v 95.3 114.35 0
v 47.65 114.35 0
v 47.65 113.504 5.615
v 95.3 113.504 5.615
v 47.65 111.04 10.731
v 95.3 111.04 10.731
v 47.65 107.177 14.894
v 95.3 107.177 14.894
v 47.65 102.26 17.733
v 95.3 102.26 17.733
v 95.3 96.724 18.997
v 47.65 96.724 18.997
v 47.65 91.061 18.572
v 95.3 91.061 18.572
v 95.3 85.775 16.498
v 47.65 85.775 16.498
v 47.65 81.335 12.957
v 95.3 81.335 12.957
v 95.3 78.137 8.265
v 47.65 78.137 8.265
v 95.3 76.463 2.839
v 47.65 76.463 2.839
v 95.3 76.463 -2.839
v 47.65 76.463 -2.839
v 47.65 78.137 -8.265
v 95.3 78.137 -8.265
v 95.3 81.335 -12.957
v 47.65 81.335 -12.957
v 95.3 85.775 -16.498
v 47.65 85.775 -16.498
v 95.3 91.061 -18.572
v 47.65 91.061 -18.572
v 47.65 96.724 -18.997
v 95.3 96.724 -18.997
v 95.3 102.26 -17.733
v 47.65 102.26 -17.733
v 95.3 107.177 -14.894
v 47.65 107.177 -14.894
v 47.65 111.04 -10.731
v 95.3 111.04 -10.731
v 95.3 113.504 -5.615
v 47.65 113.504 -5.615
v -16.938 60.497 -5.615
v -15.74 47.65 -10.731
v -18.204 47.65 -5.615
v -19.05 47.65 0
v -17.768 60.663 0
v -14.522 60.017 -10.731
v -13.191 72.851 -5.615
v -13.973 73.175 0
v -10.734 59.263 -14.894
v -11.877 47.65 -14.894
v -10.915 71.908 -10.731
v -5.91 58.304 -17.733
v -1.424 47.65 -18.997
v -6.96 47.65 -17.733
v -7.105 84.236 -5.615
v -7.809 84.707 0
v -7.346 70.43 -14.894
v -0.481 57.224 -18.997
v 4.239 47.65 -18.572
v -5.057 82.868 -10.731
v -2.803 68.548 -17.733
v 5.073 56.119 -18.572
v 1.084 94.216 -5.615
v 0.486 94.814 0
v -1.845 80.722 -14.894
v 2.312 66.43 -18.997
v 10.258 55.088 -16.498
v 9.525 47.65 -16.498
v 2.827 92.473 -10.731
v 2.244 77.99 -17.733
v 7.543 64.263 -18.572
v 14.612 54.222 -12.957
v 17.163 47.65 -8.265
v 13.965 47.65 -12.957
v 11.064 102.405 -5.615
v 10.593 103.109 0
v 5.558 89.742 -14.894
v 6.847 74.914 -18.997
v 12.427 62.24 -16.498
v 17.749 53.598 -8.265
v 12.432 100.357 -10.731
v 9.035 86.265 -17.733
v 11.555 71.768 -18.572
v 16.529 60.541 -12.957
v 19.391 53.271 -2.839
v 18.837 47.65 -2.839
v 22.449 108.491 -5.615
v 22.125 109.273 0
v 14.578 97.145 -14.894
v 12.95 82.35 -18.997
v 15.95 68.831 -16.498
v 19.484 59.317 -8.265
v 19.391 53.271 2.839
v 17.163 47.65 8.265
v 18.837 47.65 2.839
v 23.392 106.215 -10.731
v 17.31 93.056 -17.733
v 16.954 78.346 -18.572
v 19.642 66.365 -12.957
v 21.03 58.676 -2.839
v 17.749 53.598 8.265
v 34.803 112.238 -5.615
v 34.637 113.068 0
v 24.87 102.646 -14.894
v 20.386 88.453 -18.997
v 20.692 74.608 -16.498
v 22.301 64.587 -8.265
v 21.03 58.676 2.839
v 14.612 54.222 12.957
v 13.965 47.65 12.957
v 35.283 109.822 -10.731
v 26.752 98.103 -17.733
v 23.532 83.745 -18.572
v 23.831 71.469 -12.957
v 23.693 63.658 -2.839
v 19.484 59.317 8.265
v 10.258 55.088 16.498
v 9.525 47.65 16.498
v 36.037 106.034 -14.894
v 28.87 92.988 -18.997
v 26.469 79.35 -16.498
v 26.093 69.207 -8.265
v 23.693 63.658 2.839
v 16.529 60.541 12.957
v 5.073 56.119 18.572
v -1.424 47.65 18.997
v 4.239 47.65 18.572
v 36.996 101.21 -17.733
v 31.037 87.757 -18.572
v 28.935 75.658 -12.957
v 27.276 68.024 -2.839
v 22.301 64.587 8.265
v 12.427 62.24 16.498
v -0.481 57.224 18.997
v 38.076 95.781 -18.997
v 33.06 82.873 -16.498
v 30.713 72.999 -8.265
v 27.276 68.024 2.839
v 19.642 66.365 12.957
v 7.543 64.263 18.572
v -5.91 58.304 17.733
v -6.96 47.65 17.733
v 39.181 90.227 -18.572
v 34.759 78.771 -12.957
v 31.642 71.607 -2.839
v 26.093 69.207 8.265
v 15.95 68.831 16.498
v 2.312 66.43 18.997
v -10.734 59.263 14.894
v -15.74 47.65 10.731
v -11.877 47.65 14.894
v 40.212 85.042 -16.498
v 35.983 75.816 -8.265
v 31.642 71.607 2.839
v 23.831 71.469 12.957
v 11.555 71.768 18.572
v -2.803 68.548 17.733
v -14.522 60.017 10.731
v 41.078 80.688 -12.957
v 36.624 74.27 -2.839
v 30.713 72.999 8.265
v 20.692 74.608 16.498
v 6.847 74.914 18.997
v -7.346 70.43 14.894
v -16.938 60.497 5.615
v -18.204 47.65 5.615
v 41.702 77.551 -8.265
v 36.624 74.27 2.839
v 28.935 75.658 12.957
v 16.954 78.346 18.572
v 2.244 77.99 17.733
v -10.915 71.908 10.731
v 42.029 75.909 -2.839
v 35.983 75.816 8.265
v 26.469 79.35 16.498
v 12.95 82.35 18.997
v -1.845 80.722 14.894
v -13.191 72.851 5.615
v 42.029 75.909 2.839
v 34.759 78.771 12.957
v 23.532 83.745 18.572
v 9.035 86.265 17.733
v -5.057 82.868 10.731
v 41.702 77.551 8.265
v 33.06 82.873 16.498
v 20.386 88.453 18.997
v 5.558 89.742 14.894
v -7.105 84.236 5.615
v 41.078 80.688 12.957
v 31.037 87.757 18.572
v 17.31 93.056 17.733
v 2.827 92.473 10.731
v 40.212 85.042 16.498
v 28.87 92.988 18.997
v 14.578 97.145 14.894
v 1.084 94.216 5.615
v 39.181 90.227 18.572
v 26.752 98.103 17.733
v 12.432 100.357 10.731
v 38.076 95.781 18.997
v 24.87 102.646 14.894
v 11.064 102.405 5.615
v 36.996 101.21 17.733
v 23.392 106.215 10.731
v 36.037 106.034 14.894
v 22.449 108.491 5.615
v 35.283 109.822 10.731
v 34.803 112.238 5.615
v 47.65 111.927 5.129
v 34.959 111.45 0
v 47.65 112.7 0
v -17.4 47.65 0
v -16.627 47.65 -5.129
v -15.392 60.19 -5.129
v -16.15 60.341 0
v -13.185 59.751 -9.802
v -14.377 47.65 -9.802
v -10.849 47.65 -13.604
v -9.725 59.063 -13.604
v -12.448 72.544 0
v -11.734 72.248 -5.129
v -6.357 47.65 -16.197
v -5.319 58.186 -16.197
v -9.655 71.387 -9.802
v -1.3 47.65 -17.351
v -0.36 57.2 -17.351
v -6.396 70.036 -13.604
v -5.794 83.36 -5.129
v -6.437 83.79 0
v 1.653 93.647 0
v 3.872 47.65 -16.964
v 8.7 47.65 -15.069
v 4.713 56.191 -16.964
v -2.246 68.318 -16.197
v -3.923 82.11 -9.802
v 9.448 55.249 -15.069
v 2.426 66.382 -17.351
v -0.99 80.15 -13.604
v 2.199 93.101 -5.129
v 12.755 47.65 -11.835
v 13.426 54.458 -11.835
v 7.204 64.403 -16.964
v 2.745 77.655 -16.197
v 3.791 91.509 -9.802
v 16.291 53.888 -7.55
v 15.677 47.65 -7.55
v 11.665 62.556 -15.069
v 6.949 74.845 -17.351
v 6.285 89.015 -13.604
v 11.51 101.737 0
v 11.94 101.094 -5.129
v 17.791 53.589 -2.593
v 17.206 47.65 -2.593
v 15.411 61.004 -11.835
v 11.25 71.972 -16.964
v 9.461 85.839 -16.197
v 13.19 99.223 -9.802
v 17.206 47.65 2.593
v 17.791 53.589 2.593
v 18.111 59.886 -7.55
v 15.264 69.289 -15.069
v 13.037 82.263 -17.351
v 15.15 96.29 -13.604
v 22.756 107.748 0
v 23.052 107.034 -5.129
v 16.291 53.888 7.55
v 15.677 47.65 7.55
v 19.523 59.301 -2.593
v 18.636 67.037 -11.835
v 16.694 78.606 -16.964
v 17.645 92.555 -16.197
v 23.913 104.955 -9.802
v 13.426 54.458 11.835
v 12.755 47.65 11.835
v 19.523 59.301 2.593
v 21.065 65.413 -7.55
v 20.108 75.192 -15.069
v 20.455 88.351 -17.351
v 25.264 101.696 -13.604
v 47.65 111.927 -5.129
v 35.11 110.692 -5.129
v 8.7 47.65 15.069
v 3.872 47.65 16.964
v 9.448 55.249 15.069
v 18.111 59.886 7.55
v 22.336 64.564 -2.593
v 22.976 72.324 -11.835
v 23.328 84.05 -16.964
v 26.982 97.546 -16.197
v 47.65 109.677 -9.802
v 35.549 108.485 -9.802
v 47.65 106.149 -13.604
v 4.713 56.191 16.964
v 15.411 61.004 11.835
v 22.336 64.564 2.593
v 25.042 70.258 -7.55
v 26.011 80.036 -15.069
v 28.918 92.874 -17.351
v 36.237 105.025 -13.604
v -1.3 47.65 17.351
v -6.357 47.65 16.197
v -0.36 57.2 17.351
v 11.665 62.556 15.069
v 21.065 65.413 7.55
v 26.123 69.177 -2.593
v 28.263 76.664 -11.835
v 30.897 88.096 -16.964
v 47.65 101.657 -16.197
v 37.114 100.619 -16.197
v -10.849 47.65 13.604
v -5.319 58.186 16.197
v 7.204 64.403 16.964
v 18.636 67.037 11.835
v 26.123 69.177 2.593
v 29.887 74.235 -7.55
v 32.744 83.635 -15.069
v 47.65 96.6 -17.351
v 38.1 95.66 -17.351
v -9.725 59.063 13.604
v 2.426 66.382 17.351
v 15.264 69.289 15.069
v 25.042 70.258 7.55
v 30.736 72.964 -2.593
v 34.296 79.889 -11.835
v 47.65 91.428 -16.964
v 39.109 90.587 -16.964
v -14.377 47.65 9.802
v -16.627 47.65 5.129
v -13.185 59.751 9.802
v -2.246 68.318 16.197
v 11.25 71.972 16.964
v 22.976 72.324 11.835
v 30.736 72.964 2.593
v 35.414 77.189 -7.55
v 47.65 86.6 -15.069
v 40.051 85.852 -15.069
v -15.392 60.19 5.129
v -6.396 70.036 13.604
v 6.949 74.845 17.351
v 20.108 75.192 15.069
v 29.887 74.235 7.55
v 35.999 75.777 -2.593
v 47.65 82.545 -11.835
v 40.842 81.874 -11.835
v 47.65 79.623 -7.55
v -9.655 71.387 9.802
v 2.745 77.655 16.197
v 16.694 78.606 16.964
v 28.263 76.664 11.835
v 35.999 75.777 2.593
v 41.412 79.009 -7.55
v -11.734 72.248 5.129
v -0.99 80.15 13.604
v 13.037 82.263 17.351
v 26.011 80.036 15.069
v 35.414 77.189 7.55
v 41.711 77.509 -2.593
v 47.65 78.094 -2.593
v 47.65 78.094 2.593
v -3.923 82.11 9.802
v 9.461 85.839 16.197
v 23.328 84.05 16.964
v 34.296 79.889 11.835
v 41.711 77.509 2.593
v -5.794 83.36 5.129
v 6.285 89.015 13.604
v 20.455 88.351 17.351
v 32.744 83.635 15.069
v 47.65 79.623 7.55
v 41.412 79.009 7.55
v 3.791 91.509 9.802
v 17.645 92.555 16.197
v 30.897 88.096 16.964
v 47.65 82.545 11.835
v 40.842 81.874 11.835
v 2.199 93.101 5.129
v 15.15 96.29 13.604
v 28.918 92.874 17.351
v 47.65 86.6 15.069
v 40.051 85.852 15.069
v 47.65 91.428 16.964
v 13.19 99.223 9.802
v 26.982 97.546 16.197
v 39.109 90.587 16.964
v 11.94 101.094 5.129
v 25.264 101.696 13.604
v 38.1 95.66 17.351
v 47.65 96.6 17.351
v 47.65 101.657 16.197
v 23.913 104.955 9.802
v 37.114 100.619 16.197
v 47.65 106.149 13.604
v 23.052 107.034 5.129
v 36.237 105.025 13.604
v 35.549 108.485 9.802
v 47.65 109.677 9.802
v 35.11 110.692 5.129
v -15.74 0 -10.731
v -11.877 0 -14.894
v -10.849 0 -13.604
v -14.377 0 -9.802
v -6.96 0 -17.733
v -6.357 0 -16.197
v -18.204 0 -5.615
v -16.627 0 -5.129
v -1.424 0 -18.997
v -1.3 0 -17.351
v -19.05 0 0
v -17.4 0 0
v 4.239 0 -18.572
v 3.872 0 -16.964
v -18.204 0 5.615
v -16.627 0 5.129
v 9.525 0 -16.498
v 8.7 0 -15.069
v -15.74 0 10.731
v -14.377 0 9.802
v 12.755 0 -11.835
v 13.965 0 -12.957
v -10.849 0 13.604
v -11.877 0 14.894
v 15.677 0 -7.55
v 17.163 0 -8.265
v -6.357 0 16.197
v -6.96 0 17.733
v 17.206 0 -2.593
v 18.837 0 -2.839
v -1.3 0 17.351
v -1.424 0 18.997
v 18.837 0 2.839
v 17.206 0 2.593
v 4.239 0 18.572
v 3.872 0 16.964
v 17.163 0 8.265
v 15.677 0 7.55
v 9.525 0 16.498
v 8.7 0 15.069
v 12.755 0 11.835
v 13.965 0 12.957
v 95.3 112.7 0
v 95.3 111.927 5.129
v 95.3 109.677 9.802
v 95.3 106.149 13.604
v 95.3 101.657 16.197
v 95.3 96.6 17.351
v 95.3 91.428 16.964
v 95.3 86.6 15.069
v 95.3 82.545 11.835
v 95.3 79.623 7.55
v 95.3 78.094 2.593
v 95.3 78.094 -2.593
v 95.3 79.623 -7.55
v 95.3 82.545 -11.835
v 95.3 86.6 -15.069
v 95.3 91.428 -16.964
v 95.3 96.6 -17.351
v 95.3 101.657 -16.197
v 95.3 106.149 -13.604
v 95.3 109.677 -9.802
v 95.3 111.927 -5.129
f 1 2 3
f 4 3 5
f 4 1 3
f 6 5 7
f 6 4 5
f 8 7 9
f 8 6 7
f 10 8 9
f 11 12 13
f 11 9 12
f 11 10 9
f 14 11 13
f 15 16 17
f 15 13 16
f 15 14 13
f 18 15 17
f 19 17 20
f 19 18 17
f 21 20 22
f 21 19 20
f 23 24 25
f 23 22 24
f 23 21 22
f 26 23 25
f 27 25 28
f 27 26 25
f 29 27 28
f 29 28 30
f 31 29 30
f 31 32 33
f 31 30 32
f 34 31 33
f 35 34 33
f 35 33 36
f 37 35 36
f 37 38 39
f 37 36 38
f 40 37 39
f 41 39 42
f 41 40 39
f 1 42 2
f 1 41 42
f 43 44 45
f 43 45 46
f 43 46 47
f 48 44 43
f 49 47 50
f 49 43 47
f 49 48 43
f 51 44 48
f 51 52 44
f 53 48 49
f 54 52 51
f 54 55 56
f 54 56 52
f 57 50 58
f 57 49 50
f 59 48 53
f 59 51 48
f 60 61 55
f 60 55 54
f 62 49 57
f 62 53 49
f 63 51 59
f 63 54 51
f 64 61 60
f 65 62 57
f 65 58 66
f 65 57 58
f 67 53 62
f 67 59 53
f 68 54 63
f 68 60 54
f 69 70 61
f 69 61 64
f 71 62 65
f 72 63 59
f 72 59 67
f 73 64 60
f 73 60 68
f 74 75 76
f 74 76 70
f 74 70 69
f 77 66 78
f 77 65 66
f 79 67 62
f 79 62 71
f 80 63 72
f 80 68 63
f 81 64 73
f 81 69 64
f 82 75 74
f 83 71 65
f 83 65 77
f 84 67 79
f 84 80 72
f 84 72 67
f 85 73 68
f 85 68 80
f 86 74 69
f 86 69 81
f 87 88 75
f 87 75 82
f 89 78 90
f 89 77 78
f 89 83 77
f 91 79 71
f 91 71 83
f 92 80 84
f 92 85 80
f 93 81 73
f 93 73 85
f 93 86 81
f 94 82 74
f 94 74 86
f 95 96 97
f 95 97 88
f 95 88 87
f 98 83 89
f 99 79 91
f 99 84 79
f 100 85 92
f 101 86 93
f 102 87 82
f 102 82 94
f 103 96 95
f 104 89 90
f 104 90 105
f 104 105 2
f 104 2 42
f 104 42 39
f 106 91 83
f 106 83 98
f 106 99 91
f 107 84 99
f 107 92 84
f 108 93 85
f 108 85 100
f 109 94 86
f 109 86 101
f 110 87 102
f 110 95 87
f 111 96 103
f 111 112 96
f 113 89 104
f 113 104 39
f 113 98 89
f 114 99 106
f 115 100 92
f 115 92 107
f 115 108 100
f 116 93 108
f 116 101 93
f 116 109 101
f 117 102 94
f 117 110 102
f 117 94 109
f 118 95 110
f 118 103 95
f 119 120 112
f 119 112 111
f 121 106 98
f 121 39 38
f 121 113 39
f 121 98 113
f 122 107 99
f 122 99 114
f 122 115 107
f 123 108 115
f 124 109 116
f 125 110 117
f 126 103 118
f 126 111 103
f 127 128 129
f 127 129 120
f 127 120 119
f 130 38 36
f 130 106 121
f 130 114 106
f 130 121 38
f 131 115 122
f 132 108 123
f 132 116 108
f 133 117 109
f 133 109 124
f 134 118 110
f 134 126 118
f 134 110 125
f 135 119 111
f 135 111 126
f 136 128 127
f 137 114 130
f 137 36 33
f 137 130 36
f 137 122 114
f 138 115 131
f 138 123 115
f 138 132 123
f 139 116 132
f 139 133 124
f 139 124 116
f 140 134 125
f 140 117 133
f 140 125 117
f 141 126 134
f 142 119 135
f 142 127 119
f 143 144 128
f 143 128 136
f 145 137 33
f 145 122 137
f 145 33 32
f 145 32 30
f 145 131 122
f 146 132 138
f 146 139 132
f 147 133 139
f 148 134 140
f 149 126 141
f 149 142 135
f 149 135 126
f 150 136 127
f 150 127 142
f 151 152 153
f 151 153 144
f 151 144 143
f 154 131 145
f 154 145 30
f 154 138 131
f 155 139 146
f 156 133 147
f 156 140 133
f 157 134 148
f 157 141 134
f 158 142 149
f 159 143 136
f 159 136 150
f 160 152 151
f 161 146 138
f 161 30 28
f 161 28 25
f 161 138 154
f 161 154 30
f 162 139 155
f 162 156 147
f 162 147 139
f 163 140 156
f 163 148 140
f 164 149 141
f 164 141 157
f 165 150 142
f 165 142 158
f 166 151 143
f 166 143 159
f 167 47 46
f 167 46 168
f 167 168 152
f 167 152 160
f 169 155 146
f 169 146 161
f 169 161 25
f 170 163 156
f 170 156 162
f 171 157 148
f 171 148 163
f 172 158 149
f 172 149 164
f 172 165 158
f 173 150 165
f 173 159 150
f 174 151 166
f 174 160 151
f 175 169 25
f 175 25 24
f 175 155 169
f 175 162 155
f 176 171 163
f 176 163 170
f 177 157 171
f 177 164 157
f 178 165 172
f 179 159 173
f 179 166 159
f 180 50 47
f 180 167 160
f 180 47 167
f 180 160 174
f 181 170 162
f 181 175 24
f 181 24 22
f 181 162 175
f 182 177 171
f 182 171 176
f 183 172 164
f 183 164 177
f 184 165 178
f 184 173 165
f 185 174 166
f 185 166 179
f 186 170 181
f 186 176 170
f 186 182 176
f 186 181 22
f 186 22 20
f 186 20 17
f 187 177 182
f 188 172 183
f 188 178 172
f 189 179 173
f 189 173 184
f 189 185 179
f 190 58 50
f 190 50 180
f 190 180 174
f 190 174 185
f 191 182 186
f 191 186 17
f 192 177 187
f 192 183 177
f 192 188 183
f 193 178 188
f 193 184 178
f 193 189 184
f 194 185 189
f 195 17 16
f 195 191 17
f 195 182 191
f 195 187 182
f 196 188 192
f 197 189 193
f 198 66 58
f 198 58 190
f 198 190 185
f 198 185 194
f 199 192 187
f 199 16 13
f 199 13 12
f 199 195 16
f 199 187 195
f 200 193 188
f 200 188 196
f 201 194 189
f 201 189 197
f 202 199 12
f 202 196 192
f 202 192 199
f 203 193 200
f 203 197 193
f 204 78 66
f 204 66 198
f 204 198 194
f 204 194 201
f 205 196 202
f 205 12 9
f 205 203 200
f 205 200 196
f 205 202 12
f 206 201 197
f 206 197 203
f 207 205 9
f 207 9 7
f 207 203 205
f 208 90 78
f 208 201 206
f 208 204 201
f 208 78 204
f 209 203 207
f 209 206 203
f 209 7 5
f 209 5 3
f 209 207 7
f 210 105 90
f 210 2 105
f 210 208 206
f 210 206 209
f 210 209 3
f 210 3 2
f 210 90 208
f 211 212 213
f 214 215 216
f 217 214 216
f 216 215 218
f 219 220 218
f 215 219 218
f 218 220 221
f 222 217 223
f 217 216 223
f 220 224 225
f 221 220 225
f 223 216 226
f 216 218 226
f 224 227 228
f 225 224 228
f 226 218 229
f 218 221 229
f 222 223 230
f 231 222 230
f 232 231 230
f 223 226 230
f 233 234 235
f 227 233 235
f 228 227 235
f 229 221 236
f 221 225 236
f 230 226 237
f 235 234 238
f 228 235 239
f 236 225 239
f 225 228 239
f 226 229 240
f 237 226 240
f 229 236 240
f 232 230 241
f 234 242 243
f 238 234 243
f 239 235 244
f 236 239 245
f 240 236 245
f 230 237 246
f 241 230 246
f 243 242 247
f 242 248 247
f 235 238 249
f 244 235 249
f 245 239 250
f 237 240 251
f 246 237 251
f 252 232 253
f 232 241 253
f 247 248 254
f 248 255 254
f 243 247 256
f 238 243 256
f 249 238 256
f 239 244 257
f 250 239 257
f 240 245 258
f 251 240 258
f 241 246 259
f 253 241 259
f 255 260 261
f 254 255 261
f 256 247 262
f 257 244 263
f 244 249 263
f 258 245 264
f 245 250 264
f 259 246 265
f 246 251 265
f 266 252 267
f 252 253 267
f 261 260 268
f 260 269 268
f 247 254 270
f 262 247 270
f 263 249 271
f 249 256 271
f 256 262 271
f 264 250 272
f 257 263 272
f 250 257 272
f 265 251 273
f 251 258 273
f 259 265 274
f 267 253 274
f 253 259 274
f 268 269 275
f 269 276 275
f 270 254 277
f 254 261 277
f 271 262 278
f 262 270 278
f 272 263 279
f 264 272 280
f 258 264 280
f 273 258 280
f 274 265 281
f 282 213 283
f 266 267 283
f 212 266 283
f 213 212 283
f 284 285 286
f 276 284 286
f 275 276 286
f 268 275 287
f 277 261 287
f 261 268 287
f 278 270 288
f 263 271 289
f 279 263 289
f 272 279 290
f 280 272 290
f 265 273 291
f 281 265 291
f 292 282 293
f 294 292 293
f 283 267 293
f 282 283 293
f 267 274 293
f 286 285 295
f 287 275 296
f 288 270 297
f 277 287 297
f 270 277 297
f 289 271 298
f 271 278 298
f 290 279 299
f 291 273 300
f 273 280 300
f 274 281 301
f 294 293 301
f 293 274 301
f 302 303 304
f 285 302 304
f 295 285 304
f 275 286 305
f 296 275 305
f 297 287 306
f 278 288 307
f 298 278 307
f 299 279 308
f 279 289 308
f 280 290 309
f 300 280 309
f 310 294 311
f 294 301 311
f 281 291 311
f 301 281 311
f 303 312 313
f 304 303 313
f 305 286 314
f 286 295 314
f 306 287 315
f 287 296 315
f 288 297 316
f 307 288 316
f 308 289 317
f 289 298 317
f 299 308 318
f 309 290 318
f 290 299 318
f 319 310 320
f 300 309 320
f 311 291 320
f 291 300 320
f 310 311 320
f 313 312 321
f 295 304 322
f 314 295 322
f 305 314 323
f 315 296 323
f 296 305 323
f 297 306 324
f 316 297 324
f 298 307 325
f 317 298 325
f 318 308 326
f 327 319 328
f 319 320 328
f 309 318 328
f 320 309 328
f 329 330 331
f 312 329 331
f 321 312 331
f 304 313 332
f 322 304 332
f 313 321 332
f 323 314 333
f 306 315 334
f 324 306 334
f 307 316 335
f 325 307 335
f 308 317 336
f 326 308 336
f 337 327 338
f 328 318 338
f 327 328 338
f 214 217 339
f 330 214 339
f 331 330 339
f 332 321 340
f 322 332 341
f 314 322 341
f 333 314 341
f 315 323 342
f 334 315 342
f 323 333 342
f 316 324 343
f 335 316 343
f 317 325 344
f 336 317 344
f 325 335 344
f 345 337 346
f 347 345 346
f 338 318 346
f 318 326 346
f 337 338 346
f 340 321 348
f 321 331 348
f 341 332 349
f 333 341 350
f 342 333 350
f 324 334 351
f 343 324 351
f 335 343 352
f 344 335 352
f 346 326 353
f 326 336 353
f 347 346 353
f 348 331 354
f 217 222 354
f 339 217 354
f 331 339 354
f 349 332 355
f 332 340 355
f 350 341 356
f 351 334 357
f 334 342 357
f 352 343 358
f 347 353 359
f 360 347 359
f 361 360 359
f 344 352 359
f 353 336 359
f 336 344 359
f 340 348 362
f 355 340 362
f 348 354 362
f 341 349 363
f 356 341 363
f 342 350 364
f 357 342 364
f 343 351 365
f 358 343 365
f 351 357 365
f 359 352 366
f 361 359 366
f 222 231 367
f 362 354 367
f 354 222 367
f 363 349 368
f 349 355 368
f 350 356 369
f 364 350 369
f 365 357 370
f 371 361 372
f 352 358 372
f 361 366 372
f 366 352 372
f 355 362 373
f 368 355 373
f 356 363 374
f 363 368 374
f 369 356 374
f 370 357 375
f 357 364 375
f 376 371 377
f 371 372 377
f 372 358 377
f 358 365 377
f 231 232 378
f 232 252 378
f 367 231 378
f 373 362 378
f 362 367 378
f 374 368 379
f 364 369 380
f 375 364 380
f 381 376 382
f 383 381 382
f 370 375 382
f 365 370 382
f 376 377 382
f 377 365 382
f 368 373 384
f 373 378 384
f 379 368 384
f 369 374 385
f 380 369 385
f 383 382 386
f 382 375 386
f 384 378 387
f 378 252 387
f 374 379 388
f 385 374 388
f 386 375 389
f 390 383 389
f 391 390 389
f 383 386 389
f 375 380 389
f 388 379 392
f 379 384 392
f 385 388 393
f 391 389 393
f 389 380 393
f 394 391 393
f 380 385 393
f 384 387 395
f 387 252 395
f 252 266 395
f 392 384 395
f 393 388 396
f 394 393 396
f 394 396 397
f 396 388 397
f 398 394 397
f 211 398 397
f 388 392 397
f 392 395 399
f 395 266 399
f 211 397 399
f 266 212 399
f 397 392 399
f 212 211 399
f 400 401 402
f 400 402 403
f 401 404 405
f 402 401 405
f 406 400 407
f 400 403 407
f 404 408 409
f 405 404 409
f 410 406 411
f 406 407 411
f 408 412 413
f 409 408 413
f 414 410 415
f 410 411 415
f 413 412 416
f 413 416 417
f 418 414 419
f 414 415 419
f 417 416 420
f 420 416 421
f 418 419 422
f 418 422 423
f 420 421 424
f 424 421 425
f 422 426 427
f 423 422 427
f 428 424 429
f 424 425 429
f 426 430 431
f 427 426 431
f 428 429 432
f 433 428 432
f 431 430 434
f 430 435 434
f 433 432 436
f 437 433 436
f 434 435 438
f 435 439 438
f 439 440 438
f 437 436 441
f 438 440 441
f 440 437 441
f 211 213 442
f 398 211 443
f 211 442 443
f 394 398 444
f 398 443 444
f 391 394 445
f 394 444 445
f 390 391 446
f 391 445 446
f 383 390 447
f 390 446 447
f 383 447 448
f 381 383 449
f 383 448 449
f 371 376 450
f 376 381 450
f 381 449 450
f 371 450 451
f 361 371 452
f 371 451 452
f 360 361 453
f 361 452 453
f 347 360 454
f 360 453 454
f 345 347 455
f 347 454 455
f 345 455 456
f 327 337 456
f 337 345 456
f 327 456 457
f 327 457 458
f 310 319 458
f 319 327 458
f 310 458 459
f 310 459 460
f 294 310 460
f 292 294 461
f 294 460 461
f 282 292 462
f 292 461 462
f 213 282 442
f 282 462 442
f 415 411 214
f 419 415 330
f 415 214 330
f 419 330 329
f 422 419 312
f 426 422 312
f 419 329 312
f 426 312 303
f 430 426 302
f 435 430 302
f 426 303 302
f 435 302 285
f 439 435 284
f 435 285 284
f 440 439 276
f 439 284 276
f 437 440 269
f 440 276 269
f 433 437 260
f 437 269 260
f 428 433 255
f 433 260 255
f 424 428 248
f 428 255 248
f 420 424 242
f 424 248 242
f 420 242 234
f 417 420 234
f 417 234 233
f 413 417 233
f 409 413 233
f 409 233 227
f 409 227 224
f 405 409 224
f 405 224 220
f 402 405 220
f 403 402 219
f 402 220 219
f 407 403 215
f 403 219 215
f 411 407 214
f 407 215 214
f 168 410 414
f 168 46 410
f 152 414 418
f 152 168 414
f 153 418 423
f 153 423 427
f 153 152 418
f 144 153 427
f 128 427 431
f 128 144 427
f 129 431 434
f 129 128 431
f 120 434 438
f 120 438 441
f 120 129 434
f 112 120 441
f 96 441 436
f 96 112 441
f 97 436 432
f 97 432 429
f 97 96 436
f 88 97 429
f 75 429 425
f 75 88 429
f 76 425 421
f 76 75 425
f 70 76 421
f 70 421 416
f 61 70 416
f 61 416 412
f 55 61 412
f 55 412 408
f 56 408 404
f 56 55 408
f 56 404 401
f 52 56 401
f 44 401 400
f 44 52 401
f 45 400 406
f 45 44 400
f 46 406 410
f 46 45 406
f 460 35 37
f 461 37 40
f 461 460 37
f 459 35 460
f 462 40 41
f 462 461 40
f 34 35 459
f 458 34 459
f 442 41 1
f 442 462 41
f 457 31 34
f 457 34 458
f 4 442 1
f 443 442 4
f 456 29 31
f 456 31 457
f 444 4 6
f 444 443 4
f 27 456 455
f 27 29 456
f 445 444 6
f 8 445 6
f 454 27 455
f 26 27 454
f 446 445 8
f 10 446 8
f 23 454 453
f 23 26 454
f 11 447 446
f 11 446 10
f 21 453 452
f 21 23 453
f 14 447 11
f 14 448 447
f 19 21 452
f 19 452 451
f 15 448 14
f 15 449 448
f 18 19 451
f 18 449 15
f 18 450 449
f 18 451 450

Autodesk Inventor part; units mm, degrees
ref_plane "YZ Plane" through (0, 0, 0) normal (1, 0, 0) x (0, 1, 0)
ref_plane "XZ Plane" through (0, 0, 0) normal (0, 1, 0) x (-1, 0, 0)
ref_plane "XY Plane" through (0, 0, 0) normal (0, 0, 1) x (1, 0, 0)
sketch "Sketch1" plane through (0, 0, 0) normal (0, 0, 1) x (1, 0, 0)
  line L0 (0, 0) -> (0, 47.65)
  line L1 (47.65, 95.3) -> (95.3, 95.3)
  arc A0 (47.65, 95.3) -> (0, 47.65) centre (47.65, 47.65) ccw
  dimension "d0" = 95.3
  dimension "d1" = 95.3
  dimension "d2" = 47.65
sketch "Sketch2" plane through (0, 0, 0) normal (0, 1, 0) x (-1, 0, 0)
  circle A0 centre (0, 0) radius 19.05
  circle A1 centre (0, 0) radius 17.4
  dimension "d4" = 1.65
  dimension "d5" = 38.1
sweep "Sweep1" add profiles "Sketch2" path "Sketch1"
equation "\"d1\" = d0"
equation "\"d2\" = 0.5 * d0"
properties part number "ASME BPE 90DEG ELB-38.1"
